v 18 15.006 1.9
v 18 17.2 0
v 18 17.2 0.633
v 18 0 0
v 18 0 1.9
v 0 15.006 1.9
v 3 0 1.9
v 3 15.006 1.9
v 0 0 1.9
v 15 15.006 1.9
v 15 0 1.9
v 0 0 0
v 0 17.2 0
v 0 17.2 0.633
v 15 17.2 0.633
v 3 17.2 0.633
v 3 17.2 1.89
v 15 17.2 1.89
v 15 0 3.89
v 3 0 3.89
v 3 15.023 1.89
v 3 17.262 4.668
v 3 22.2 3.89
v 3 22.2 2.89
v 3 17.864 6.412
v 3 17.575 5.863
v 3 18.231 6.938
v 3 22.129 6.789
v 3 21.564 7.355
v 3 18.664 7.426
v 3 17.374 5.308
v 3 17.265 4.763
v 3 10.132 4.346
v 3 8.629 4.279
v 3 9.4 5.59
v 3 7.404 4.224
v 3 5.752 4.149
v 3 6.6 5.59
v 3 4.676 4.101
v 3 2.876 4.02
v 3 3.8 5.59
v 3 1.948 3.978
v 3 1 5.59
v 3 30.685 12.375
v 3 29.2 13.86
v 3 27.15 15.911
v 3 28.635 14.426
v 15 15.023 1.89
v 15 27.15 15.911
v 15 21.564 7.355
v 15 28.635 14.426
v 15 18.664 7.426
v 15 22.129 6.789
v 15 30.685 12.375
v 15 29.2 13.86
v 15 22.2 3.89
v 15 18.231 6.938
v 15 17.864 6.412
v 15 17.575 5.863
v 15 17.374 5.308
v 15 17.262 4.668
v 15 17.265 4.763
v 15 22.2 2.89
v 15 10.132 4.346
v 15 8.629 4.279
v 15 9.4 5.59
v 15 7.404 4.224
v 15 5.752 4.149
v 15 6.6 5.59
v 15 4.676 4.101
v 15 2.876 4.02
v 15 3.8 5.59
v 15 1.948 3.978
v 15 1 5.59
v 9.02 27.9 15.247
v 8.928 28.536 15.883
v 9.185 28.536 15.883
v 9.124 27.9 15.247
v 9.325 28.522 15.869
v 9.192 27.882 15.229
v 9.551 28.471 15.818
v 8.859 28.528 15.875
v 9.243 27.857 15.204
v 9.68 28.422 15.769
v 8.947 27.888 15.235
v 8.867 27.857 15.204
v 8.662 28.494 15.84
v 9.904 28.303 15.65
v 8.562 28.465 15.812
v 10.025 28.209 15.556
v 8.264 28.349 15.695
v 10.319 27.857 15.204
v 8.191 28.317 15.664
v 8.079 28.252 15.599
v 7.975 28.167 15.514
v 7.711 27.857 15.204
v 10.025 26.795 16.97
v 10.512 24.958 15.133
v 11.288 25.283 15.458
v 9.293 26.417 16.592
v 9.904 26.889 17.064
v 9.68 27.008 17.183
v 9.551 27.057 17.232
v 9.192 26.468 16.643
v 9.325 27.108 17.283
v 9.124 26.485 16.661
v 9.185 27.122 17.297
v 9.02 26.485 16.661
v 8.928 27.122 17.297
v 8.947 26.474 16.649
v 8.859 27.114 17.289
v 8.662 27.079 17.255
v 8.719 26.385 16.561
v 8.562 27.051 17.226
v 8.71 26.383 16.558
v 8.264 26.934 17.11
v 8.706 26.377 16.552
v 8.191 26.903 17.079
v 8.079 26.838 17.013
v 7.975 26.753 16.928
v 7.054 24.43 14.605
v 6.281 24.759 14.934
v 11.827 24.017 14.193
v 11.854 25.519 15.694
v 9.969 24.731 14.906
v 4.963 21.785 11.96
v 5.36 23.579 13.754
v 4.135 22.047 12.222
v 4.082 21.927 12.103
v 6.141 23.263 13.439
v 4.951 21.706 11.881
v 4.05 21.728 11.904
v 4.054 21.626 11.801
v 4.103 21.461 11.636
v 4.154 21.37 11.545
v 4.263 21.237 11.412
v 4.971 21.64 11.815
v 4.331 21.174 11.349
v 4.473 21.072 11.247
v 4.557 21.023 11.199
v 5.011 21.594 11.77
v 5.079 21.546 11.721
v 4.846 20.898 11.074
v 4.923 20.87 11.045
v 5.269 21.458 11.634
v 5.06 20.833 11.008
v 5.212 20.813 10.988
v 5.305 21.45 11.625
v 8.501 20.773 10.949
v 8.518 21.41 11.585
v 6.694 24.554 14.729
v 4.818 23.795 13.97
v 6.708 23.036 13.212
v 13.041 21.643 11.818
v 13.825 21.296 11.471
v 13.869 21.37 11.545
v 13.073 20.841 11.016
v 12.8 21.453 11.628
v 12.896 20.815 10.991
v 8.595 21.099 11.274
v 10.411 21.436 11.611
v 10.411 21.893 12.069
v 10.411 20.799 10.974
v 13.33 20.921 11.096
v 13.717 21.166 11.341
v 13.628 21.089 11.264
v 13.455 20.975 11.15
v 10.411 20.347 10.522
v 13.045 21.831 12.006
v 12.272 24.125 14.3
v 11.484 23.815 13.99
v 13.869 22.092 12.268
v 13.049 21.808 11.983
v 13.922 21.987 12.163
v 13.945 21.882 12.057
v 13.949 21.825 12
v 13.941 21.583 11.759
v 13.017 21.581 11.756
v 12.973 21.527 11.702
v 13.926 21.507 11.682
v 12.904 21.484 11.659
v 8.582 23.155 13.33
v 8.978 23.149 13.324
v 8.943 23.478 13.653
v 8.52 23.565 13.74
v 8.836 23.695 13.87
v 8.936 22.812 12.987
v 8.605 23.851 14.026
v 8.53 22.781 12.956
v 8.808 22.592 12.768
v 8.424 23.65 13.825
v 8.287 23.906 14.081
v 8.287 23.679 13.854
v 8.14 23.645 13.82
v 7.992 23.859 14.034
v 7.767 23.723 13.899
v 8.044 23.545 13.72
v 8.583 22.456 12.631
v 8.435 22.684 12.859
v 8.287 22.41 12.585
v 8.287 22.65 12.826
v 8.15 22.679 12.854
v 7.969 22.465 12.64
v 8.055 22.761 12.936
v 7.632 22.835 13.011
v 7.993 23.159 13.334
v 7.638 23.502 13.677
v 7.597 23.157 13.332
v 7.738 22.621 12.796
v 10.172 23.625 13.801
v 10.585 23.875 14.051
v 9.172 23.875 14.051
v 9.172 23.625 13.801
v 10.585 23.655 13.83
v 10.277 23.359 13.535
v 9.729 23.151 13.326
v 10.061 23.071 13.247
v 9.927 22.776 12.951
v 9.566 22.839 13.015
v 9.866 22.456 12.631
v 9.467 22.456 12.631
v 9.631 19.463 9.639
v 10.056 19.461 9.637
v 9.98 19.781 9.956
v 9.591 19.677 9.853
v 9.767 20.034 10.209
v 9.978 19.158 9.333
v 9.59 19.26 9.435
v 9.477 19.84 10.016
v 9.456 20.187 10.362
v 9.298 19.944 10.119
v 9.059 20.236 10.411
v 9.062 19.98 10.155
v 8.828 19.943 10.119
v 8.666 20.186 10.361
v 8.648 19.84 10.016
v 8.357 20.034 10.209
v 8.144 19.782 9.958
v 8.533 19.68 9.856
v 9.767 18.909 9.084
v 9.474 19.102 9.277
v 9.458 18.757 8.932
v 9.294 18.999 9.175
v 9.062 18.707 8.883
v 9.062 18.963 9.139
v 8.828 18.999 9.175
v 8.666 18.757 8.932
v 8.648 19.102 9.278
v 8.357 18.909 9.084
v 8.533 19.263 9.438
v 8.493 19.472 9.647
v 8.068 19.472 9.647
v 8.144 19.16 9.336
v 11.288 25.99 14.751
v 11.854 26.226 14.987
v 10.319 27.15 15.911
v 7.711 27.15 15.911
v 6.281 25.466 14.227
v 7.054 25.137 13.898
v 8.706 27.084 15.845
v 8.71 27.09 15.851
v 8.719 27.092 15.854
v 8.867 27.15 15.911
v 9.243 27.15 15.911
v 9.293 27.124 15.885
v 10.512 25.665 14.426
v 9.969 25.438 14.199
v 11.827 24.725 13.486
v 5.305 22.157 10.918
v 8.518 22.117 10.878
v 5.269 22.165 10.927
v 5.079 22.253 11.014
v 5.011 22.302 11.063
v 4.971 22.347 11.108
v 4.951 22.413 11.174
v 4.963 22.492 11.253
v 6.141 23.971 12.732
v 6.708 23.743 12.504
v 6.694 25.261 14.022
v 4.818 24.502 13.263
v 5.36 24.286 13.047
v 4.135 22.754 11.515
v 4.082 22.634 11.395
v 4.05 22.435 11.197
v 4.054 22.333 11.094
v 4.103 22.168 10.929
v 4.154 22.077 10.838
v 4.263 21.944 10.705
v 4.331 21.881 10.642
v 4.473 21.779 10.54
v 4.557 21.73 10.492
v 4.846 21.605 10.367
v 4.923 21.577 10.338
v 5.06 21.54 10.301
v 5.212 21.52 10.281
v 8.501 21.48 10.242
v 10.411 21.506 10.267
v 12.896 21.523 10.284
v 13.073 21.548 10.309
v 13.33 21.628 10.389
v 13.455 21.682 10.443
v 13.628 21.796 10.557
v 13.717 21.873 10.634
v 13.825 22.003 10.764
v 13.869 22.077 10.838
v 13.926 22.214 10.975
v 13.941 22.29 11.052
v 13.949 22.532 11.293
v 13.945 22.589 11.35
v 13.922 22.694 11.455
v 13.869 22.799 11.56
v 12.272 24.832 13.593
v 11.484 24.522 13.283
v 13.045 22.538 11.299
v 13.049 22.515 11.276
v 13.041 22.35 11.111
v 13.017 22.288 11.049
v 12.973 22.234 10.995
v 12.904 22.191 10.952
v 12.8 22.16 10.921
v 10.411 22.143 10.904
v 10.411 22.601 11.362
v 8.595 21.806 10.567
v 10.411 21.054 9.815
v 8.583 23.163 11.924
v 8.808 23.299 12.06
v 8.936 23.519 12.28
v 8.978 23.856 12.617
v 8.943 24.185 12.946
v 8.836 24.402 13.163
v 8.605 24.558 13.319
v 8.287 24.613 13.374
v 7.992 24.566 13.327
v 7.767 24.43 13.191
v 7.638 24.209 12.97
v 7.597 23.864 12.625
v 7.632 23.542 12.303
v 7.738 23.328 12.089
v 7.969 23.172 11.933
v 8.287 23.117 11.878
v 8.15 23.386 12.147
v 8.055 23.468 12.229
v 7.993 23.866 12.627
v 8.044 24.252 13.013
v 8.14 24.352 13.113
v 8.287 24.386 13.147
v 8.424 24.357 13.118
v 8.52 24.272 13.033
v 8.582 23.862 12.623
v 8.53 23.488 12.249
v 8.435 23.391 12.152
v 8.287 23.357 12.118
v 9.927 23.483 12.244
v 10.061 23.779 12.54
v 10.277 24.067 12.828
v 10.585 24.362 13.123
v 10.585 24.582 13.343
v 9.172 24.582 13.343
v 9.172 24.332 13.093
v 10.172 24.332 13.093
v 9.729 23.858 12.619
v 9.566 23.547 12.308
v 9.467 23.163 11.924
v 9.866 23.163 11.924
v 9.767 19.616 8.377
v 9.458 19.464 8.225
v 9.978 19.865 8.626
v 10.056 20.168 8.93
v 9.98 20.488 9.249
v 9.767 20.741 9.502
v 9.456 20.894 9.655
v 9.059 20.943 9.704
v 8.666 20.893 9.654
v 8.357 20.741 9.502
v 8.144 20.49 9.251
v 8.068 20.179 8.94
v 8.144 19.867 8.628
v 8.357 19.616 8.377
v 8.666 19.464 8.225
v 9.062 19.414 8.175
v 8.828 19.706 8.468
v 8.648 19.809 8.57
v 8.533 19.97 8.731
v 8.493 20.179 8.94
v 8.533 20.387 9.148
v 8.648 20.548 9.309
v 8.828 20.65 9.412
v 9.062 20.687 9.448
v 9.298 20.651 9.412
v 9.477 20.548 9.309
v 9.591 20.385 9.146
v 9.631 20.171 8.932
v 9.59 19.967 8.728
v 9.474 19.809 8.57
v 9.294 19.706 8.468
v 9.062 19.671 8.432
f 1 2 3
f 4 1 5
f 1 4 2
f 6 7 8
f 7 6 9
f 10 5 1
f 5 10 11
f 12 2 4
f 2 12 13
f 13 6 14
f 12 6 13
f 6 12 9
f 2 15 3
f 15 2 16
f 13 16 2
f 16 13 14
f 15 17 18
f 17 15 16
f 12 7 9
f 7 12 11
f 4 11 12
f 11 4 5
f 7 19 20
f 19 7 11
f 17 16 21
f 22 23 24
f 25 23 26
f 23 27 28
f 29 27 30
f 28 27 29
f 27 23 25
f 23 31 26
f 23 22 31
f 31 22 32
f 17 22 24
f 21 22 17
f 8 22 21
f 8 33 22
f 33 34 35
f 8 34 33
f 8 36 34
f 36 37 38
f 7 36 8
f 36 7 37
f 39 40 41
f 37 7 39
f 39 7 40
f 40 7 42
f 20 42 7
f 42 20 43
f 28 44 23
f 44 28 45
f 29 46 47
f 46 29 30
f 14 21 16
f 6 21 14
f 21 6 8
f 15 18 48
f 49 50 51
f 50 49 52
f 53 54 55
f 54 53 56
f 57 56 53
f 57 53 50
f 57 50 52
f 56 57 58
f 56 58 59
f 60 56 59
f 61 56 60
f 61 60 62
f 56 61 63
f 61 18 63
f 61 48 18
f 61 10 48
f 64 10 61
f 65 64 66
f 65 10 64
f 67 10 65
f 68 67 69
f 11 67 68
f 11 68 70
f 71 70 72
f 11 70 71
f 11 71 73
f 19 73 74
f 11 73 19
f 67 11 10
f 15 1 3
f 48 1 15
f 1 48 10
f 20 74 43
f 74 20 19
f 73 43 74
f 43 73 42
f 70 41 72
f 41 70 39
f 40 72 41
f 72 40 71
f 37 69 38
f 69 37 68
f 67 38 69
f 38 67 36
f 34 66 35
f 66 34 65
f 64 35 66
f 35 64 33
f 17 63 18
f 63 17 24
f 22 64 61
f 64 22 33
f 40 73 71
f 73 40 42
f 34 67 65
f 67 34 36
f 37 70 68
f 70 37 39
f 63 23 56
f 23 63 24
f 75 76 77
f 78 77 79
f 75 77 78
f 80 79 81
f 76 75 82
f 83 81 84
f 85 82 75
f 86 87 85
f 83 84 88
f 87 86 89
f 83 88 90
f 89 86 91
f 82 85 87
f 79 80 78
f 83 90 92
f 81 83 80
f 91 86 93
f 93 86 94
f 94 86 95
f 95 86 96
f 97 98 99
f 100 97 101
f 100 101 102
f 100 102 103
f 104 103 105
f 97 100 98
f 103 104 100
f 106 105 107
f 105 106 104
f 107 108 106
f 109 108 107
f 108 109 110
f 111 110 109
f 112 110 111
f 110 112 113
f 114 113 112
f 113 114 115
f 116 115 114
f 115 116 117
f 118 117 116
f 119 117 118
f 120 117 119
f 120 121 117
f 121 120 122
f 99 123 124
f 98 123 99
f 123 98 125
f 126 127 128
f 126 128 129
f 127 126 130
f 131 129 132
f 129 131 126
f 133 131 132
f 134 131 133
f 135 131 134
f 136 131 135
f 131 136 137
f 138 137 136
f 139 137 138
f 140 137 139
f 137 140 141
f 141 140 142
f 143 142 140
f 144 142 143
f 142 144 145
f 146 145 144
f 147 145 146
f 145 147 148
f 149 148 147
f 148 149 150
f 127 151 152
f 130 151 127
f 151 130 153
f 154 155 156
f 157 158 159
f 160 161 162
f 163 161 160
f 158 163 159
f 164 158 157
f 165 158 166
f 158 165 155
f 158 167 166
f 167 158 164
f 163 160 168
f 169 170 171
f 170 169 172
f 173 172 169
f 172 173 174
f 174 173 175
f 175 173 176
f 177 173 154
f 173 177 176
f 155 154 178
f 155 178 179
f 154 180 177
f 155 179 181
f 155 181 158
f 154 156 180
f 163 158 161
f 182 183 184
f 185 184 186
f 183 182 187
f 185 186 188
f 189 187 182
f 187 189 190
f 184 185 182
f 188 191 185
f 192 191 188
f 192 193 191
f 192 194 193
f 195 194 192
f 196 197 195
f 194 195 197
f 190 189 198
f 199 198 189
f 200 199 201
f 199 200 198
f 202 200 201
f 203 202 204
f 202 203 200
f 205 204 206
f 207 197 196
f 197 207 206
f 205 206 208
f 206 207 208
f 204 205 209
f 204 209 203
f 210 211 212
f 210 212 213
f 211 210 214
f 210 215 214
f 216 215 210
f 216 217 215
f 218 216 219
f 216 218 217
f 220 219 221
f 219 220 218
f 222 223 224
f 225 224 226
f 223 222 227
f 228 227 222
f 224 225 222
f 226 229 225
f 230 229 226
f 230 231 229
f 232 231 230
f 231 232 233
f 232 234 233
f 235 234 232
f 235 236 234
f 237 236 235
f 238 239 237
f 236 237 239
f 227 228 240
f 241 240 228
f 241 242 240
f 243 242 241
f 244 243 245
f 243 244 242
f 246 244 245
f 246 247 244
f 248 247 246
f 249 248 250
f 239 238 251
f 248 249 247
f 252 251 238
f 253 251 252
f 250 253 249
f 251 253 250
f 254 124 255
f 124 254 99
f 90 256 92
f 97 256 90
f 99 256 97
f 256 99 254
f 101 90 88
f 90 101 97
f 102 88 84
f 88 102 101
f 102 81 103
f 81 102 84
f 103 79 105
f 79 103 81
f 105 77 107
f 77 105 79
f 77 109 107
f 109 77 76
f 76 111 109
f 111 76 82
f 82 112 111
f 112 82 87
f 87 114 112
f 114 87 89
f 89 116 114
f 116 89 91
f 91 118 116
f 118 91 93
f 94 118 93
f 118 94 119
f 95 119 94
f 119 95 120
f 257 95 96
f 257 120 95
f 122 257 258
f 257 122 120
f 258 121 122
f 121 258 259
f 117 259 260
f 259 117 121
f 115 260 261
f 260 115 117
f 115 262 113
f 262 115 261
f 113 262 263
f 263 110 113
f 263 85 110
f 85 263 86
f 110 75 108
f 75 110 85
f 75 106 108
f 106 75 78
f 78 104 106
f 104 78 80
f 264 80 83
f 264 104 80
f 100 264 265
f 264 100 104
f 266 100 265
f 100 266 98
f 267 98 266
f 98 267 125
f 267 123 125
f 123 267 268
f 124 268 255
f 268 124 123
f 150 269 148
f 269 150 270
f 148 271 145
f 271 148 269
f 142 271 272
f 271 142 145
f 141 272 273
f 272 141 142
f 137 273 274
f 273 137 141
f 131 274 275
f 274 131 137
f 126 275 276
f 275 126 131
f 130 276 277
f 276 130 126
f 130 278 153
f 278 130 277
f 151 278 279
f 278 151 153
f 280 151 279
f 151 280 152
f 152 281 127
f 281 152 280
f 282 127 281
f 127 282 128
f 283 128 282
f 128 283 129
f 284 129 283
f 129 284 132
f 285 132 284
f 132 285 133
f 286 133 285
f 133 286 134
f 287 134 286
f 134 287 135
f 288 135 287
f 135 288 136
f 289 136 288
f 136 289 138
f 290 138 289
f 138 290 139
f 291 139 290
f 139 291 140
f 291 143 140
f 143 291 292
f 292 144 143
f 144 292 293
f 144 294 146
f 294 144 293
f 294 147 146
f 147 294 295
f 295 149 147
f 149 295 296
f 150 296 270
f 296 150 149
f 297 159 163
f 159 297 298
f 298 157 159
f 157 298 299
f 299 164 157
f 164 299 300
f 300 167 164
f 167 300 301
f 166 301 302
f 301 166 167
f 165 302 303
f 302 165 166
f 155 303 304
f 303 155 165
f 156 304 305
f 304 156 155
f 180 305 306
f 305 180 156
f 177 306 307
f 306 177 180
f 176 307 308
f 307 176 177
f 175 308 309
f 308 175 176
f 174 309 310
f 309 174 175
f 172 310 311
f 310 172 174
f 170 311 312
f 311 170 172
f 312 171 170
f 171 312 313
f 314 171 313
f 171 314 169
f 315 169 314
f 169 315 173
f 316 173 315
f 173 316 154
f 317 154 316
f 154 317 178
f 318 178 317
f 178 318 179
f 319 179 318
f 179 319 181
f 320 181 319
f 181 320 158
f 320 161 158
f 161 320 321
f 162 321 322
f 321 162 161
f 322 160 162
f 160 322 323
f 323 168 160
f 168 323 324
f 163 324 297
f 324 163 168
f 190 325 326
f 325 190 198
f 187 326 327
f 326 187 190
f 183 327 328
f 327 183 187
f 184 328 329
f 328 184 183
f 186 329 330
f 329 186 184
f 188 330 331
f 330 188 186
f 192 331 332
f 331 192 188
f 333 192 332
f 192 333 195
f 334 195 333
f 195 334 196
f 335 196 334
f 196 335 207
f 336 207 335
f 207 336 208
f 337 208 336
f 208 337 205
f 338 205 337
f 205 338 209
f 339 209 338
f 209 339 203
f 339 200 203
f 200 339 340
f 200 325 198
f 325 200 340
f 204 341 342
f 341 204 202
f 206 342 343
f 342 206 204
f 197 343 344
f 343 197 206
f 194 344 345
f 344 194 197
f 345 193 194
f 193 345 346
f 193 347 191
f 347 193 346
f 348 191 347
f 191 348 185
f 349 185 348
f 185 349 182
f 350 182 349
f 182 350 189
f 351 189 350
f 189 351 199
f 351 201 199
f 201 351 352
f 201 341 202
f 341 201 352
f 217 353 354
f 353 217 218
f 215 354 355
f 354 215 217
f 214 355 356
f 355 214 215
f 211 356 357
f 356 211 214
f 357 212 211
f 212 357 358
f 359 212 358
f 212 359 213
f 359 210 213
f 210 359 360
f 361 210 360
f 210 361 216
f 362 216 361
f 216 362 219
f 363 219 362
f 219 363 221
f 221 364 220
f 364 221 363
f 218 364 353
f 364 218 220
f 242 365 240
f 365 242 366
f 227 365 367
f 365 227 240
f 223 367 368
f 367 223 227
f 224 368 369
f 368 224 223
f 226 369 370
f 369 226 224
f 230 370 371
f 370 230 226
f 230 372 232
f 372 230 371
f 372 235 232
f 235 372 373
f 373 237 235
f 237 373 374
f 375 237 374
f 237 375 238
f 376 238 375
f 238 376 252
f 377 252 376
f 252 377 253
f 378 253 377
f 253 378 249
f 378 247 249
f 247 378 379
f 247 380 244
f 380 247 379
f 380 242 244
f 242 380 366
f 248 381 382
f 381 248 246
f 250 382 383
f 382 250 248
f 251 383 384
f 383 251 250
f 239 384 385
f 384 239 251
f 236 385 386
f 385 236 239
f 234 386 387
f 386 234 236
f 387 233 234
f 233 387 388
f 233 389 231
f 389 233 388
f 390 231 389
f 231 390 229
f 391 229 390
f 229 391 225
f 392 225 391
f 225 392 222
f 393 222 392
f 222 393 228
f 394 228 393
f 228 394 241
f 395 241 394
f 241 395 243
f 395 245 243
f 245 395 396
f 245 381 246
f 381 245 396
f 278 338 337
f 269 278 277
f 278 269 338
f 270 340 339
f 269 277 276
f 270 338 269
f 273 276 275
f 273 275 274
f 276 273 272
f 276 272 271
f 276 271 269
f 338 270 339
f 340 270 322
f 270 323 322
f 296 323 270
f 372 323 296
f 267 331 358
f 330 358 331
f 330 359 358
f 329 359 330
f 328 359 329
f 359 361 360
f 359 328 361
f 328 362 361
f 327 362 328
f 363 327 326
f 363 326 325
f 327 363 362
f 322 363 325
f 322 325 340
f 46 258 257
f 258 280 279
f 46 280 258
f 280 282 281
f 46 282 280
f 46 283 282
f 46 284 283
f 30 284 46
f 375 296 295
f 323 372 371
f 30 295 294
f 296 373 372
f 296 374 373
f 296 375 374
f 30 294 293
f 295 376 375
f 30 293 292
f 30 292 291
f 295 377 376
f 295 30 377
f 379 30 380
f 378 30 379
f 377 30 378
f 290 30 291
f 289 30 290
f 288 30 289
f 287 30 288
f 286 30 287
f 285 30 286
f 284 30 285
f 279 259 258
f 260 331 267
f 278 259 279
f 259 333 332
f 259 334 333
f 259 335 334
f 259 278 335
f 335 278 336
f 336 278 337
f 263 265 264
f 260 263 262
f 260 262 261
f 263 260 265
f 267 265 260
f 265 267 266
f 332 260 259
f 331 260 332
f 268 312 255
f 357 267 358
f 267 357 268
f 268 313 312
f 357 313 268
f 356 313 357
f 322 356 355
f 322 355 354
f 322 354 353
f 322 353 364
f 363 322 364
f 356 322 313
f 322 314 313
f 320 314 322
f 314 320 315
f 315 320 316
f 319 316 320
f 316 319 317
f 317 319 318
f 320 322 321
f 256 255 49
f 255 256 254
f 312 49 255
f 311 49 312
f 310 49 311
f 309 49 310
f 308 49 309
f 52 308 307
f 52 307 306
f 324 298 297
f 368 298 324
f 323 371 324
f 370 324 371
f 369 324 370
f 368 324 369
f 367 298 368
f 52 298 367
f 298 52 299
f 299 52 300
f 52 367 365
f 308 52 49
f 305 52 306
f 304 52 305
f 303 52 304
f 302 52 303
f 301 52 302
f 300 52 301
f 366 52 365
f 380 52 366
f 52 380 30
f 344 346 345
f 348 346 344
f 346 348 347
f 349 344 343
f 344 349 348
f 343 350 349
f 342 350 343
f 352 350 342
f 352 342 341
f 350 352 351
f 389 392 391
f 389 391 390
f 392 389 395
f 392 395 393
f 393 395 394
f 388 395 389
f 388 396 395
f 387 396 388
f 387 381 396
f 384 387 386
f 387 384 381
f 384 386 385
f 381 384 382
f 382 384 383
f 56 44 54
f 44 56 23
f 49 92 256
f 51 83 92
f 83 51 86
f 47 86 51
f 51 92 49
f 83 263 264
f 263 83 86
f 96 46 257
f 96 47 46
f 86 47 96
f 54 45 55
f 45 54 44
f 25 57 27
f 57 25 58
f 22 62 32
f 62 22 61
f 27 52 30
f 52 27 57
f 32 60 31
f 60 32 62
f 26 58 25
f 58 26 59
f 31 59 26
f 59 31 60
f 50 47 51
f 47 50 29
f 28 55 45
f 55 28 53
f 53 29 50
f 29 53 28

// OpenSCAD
// file: hotshoe_paper_clip.scad
hs_w      = 18.0;
hs_l      = 17.2;
hs_h      = 1.9; // 2
hs2_w     = 12;
//hs2_l     = hs_l+5;
hs2_h     = 2;
hs2_x_off = (hs_w-hs2_w)/2;
hs2_elev  = 1;
hs3_l     = 12;
hs3_h     = 5;
hs3_w     = 0.8;

module hotshoe(
    logofile="", logooffset=1,
    len=5
    ) {
    hs2_l = hs_l+len;
    union() {
        // lower hotshoe
        difference() {
            cube([hs_w, hs_l, hs_h]);
            translate([-1,hs_l,hs_h/3]) rotate([60,0,0]) cube([hs2_x_off+1, 10,10]);
            translate([hs2_x_off+hs2_w,hs_l,hs_h/3]) rotate([60,0,0]) cube([hs2_x_off+1, 10,10]);
        }
        // upper plate including grip
        translate([hs2_x_off, 0, hs_h-0.01]) {
            rotate([90,0,90])
            linear_extrude(height=hs2_w) {
                polygon(
                points=[[0,0], [hs2_l,0], [hs_l,0], [hs2_l,hs2_elev],[hs2_l,hs2_elev+hs2_h],
                //[hs_l,hs2_h],
                [0,hs2_h]],
                paths=[[0,1,2,3,4,5,6]]
                );
            }
            for ( i = [0:3]) {
                translate([hs2_w/2,1+2.8*(i),hs2_h]) scale([1,1,1.7]) rotate([45,0,0]) cube([hs2_w,sqrt(2), sqrt(2)], center=true);
            }
        }
        translate([hs2_x_off, hs2_l, hs_h+hs2_elev+hs2_h/2-0.01])
        rotate([45,0,0])
        difference() {
            union() {
                // Logo
                translate([logooffset,1,hs3_h-1]) linear_extrude(height=1+1) import(file=logofile);
                // clasp
                cube([hs2_w, hs3_l, hs3_h]);
                translate([0,0,hs3_h/2]) scale([1,1.5,1]) rotate([0,90,0]) cylinder(h=hs2_w, r=hs3_h/2, $fn=36);
            }
            translate([-1,2,(hs3_h-hs3_w)/2]) cube([hs2_w+2, hs3_l, hs3_w]);
        }
    }
}
// main file
include <hotshoe_paper_clip.scad>

hotshoe(logofile="PLA.dxf", logooffset=1);
